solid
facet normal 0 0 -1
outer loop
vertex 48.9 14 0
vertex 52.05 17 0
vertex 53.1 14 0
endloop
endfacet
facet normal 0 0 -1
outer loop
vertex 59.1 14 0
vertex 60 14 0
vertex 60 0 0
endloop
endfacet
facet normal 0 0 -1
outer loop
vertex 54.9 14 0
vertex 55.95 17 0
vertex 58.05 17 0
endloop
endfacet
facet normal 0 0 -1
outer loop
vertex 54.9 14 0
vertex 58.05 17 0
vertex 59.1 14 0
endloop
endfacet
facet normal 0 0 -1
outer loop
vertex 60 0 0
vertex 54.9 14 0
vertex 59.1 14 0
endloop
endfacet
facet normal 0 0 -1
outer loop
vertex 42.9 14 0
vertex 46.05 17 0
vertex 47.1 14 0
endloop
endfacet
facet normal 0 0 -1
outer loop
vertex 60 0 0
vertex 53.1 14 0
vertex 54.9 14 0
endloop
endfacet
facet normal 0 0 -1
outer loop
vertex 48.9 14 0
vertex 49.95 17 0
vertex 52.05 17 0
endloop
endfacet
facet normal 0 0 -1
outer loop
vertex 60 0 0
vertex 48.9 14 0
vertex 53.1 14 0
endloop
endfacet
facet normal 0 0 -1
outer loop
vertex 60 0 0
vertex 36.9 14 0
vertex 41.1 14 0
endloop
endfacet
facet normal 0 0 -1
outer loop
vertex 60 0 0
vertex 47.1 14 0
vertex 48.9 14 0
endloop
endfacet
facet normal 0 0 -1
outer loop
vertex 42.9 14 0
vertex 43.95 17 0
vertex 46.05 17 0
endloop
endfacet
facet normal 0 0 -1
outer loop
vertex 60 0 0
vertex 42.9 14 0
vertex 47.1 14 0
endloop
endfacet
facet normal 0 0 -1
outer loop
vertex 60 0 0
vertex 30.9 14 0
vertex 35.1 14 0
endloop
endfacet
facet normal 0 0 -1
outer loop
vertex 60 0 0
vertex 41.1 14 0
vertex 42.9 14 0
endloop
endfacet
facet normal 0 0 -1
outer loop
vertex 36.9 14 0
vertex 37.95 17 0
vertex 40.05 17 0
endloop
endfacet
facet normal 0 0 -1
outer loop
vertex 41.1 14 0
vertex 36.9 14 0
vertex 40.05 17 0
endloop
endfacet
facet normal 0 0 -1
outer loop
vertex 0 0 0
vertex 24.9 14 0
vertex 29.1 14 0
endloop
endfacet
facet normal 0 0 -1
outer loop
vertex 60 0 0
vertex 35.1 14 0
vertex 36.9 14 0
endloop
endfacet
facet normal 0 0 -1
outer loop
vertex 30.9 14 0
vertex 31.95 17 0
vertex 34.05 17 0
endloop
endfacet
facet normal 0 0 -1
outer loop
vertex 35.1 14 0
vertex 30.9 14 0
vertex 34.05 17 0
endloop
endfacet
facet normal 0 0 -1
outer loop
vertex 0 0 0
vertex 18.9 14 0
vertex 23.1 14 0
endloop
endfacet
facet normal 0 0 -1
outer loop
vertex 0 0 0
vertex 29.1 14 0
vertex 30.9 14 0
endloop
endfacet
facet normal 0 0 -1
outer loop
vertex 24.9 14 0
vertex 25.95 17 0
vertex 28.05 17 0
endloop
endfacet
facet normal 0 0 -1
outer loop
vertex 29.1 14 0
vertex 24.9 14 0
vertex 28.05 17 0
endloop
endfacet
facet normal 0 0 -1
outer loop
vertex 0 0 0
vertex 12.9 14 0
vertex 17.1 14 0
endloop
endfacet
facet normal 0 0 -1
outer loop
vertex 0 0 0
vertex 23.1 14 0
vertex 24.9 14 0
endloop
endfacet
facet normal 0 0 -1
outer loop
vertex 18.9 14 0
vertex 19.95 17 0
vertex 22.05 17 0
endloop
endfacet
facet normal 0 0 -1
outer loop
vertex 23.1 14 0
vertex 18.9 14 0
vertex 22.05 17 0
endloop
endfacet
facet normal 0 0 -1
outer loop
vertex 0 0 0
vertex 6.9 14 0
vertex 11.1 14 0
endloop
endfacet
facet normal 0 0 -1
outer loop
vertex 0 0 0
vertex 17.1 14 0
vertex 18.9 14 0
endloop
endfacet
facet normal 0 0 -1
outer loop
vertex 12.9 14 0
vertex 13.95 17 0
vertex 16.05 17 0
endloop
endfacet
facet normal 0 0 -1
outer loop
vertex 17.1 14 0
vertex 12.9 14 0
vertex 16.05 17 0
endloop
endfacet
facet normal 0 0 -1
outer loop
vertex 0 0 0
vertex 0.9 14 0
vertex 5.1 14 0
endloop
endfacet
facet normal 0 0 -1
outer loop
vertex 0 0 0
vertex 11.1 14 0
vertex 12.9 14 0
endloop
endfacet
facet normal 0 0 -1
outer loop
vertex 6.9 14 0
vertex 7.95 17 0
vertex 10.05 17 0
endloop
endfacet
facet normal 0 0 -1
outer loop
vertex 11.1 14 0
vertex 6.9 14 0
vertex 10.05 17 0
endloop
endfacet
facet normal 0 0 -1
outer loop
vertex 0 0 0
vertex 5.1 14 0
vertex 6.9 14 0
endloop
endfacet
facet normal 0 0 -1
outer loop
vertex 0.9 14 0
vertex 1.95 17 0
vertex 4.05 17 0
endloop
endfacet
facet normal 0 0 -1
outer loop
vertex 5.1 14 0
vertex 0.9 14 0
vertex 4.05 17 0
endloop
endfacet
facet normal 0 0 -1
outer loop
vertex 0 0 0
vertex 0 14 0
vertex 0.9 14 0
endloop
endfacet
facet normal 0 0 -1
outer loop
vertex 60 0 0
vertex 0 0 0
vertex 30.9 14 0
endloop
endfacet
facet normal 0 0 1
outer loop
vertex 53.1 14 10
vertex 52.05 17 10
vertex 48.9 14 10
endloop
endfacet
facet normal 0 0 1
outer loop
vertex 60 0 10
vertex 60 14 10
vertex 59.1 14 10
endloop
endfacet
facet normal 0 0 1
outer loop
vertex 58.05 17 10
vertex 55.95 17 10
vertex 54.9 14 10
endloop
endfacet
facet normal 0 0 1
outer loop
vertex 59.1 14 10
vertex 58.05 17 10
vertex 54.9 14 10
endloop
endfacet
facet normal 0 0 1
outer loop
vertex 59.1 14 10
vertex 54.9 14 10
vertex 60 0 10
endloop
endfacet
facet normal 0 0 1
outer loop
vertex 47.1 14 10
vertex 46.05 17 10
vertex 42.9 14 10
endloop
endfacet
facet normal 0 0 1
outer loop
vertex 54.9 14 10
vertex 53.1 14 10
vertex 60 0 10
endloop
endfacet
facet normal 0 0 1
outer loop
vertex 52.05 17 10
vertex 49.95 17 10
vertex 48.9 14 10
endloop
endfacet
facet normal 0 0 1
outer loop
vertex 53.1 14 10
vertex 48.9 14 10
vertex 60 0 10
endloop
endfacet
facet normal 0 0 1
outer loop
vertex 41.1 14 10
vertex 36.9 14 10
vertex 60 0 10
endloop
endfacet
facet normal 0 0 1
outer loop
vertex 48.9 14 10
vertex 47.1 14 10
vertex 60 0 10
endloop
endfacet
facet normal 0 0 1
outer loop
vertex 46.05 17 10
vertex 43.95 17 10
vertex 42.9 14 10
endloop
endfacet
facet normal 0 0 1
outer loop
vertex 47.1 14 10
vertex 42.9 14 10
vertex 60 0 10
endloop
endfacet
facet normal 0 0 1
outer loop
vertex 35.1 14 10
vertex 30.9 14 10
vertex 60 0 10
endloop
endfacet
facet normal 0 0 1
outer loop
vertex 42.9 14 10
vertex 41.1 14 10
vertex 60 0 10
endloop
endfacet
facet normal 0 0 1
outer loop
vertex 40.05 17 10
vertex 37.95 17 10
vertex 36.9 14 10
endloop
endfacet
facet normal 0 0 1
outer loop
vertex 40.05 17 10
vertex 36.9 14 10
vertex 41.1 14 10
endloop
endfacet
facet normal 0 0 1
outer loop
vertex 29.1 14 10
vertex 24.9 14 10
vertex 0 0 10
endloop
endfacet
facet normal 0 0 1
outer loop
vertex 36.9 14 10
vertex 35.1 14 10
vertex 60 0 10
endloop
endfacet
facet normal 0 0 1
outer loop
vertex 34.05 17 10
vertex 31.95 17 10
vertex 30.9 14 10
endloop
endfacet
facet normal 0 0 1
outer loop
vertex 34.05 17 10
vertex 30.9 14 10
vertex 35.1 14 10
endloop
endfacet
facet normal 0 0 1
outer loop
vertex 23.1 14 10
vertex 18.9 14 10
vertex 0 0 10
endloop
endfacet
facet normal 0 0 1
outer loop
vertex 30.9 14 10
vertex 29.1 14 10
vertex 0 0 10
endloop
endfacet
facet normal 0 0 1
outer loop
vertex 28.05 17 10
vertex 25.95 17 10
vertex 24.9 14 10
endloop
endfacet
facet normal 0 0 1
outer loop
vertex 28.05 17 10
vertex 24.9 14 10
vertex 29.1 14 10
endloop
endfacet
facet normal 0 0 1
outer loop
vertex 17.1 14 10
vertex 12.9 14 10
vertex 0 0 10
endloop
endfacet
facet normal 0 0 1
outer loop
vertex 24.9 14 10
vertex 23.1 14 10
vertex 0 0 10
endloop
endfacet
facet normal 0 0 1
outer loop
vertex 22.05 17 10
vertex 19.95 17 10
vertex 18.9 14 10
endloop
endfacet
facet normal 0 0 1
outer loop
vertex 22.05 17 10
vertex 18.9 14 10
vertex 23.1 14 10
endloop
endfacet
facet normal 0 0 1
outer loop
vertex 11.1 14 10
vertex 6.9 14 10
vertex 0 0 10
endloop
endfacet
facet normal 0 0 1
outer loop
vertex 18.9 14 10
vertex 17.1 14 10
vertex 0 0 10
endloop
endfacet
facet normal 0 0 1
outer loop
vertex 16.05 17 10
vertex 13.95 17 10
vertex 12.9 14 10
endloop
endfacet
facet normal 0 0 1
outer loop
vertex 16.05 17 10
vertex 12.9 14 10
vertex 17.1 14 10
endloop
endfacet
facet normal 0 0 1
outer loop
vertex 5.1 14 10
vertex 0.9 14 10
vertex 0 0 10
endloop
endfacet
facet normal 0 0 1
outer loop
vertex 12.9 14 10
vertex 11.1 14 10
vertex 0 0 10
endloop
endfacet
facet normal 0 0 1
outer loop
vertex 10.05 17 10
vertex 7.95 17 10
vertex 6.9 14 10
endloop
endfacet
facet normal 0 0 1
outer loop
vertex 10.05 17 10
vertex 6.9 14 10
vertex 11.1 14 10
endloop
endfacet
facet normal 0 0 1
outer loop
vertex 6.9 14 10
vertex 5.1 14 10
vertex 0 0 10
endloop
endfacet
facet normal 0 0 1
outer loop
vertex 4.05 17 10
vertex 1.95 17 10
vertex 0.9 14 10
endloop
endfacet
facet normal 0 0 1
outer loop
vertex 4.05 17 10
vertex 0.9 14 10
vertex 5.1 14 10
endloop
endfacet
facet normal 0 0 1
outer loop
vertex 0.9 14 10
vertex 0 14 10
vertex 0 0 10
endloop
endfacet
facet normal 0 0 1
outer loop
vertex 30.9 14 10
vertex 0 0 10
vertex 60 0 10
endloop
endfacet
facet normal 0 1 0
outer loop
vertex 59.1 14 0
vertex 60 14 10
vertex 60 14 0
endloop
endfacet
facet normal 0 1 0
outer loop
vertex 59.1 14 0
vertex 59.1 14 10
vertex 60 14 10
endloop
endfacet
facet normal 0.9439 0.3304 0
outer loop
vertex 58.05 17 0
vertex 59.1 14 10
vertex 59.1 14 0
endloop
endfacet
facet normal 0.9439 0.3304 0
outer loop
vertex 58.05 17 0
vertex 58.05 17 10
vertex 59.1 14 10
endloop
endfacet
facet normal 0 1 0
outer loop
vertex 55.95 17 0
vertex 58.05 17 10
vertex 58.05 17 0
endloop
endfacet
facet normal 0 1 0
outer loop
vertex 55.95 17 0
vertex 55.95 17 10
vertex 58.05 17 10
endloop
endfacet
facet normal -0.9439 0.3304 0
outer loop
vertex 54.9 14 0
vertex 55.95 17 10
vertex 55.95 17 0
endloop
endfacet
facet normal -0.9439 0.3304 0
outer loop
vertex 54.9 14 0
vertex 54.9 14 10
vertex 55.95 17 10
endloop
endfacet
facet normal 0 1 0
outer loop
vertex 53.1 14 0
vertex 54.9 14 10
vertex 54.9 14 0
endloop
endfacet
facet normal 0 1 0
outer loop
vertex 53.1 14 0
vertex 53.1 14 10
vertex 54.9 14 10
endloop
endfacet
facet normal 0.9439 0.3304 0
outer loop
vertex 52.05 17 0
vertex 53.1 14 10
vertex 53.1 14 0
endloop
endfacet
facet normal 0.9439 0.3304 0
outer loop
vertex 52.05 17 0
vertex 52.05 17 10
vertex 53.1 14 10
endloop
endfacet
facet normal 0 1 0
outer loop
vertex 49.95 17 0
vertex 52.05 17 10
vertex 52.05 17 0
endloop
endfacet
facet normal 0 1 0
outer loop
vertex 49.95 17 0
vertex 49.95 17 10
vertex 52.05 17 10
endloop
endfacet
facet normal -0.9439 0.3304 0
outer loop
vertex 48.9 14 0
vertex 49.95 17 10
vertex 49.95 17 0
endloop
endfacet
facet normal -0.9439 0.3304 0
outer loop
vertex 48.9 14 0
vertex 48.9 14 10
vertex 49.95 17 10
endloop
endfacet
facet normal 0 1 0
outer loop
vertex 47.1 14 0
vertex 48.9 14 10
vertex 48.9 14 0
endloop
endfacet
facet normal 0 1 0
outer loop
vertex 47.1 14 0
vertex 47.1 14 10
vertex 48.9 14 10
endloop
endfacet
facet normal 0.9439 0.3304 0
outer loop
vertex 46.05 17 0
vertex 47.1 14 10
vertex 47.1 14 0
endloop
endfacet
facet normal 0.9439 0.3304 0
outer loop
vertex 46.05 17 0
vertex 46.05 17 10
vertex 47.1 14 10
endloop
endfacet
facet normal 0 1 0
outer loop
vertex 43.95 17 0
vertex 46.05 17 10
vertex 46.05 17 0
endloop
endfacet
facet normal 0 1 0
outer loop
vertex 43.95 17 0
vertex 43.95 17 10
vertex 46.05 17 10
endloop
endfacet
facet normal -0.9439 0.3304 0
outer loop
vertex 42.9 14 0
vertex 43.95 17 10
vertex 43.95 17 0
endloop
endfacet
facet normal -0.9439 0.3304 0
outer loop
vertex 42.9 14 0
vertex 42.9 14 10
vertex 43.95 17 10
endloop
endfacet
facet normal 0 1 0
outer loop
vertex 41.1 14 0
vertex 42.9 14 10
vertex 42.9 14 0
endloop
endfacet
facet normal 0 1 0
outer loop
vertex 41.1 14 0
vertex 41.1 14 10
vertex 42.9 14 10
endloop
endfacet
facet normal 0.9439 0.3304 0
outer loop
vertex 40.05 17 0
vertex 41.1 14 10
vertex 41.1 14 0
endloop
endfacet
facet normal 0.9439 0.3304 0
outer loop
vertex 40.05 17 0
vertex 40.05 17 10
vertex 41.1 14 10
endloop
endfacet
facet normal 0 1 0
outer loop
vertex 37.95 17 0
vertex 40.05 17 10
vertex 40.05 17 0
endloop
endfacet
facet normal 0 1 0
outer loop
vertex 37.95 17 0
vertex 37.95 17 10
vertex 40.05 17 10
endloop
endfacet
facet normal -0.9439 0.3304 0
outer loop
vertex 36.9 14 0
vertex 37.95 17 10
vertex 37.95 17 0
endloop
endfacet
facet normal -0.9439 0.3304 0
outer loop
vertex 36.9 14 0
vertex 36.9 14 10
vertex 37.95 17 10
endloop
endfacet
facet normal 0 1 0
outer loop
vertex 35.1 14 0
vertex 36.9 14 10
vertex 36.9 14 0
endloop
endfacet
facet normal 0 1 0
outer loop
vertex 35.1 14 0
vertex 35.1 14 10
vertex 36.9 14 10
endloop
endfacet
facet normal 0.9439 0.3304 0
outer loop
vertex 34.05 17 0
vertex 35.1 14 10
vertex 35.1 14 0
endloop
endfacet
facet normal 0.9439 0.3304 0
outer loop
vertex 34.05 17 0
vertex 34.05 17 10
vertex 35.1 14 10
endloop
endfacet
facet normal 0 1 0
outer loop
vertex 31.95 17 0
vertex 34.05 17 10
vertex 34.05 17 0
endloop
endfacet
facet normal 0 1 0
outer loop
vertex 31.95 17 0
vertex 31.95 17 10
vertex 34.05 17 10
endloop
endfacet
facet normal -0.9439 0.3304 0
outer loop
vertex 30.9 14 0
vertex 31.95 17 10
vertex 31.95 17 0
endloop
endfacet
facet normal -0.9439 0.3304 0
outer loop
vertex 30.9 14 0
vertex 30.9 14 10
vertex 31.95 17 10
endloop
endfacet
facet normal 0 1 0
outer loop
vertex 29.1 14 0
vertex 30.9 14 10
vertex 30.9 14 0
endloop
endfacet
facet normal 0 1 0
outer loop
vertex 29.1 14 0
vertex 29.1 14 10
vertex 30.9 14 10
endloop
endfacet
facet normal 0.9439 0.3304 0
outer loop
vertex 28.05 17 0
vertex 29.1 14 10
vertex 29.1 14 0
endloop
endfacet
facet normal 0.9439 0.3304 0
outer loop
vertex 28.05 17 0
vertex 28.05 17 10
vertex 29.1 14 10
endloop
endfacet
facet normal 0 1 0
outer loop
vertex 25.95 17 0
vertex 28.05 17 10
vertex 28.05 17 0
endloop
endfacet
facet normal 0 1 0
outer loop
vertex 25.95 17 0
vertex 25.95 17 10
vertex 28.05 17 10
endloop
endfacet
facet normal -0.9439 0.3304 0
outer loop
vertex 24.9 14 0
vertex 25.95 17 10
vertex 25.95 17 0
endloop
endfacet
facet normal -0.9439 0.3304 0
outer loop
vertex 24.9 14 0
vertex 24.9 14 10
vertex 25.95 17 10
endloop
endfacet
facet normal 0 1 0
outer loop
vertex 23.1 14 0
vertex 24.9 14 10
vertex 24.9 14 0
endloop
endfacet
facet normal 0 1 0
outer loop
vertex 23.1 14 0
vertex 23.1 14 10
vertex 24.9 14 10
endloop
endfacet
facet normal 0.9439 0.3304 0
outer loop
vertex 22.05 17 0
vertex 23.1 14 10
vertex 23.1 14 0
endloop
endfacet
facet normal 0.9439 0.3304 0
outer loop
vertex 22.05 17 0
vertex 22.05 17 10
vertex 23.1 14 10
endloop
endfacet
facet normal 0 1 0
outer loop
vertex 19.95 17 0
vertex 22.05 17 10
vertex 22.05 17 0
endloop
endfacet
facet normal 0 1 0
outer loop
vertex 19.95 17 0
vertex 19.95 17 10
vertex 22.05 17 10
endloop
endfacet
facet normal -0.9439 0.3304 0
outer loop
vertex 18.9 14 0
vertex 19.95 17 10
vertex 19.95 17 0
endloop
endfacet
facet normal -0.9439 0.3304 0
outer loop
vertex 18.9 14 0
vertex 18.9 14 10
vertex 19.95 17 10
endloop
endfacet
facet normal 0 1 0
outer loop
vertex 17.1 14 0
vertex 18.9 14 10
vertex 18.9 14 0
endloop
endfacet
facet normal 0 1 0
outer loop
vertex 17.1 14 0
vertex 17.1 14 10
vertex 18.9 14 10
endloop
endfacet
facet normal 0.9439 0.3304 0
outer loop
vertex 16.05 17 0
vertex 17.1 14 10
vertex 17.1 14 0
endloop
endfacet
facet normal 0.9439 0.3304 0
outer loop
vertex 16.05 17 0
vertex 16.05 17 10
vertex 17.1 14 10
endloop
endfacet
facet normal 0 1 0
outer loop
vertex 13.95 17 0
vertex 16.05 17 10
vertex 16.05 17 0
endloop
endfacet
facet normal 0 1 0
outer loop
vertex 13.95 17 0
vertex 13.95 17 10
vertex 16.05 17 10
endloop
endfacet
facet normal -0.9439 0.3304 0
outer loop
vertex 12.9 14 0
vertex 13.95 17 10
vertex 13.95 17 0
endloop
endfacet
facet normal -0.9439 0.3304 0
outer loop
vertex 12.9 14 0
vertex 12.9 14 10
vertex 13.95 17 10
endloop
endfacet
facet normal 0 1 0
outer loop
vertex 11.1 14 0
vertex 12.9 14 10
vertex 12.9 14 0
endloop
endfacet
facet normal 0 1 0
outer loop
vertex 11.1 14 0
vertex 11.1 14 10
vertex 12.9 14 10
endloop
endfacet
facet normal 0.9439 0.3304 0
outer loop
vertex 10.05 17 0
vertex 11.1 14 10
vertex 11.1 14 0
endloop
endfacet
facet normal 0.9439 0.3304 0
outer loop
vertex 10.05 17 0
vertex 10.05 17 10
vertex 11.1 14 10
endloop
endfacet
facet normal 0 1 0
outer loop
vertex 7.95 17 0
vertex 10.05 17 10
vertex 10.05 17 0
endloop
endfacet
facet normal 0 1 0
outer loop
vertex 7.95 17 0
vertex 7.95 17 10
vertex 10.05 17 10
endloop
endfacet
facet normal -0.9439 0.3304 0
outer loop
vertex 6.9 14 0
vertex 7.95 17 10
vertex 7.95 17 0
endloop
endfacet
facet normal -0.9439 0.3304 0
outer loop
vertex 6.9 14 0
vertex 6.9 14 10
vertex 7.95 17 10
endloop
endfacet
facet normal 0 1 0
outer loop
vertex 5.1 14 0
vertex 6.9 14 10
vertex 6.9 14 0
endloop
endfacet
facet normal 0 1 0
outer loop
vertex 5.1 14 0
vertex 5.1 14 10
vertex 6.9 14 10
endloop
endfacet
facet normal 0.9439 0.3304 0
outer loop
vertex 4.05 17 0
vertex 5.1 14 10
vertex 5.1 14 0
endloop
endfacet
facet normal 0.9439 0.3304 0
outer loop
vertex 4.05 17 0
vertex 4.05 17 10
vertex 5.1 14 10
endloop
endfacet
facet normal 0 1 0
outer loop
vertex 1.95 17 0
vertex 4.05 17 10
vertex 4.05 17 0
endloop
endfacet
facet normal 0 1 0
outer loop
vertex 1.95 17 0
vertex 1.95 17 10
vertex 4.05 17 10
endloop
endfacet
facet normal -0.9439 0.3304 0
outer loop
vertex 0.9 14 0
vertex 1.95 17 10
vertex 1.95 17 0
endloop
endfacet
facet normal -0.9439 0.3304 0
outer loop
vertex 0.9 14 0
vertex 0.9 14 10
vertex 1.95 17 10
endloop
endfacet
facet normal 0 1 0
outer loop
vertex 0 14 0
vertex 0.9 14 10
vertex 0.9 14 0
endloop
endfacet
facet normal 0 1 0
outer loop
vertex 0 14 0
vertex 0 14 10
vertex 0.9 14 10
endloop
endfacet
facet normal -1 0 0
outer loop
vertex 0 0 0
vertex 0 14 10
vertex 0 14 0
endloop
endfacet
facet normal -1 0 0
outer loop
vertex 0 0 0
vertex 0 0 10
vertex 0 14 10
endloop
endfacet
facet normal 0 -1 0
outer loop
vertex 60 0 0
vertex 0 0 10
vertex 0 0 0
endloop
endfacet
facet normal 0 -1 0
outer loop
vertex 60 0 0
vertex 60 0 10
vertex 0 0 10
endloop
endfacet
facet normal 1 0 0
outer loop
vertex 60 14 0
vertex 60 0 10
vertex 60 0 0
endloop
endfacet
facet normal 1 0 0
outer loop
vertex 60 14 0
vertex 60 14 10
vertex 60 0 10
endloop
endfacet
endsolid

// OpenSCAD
$fn = 32;

// ----------------------------------------------------------------------
// Gear rack: 10 teeth, pitch 6 mm
// ----------------------------------------------------------------------

// --- parameters (mm) ---
teeth = 10;               // number of teeth
pitch = 6;                // tooth pitch, X
root_w = 4.2;             // tooth width at the root
tip_w = 2.1;              // tooth width at the tip
base_h = 14;              // rack body height, Y
tooth_h = 3;              // tooth height above the body
plate_t = 10;             // rack width, Z (extrusion height)

rack_l = teeth * pitch;  // overall length
total_h = base_h + tooth_h;  // overall height

profile = [[0, 0], [60, 0], [60, 14], [59.1, 14], [58.05, 17], [55.95, 17], [54.9, 14], [53.1, 14], [52.05, 17], [49.95, 17], [48.9, 14], [47.1, 14], [46.05, 17], [43.95, 17], [42.9, 14], [41.1, 14], [40.05, 17], [37.95, 17], [36.9, 14], [35.1, 14], [34.05, 17], [31.95, 17], [30.9, 14], [29.1, 14], [28.05, 17], [25.95, 17], [24.9, 14], [23.1, 14], [22.05, 17], [19.95, 17], [18.9, 14], [17.1, 14], [16.05, 17], [13.95, 17], [12.9, 14], [11.1, 14], [10.05, 17], [7.95, 17], [6.9, 14], [5.1, 14], [4.05, 17], [1.95, 17], [0.9, 14], [0, 14]];  // primary outline, 44 points, counter clockwise

// --- the one profile operation ---
linear_extrude(height = plate_t) polygon(points = profile);
